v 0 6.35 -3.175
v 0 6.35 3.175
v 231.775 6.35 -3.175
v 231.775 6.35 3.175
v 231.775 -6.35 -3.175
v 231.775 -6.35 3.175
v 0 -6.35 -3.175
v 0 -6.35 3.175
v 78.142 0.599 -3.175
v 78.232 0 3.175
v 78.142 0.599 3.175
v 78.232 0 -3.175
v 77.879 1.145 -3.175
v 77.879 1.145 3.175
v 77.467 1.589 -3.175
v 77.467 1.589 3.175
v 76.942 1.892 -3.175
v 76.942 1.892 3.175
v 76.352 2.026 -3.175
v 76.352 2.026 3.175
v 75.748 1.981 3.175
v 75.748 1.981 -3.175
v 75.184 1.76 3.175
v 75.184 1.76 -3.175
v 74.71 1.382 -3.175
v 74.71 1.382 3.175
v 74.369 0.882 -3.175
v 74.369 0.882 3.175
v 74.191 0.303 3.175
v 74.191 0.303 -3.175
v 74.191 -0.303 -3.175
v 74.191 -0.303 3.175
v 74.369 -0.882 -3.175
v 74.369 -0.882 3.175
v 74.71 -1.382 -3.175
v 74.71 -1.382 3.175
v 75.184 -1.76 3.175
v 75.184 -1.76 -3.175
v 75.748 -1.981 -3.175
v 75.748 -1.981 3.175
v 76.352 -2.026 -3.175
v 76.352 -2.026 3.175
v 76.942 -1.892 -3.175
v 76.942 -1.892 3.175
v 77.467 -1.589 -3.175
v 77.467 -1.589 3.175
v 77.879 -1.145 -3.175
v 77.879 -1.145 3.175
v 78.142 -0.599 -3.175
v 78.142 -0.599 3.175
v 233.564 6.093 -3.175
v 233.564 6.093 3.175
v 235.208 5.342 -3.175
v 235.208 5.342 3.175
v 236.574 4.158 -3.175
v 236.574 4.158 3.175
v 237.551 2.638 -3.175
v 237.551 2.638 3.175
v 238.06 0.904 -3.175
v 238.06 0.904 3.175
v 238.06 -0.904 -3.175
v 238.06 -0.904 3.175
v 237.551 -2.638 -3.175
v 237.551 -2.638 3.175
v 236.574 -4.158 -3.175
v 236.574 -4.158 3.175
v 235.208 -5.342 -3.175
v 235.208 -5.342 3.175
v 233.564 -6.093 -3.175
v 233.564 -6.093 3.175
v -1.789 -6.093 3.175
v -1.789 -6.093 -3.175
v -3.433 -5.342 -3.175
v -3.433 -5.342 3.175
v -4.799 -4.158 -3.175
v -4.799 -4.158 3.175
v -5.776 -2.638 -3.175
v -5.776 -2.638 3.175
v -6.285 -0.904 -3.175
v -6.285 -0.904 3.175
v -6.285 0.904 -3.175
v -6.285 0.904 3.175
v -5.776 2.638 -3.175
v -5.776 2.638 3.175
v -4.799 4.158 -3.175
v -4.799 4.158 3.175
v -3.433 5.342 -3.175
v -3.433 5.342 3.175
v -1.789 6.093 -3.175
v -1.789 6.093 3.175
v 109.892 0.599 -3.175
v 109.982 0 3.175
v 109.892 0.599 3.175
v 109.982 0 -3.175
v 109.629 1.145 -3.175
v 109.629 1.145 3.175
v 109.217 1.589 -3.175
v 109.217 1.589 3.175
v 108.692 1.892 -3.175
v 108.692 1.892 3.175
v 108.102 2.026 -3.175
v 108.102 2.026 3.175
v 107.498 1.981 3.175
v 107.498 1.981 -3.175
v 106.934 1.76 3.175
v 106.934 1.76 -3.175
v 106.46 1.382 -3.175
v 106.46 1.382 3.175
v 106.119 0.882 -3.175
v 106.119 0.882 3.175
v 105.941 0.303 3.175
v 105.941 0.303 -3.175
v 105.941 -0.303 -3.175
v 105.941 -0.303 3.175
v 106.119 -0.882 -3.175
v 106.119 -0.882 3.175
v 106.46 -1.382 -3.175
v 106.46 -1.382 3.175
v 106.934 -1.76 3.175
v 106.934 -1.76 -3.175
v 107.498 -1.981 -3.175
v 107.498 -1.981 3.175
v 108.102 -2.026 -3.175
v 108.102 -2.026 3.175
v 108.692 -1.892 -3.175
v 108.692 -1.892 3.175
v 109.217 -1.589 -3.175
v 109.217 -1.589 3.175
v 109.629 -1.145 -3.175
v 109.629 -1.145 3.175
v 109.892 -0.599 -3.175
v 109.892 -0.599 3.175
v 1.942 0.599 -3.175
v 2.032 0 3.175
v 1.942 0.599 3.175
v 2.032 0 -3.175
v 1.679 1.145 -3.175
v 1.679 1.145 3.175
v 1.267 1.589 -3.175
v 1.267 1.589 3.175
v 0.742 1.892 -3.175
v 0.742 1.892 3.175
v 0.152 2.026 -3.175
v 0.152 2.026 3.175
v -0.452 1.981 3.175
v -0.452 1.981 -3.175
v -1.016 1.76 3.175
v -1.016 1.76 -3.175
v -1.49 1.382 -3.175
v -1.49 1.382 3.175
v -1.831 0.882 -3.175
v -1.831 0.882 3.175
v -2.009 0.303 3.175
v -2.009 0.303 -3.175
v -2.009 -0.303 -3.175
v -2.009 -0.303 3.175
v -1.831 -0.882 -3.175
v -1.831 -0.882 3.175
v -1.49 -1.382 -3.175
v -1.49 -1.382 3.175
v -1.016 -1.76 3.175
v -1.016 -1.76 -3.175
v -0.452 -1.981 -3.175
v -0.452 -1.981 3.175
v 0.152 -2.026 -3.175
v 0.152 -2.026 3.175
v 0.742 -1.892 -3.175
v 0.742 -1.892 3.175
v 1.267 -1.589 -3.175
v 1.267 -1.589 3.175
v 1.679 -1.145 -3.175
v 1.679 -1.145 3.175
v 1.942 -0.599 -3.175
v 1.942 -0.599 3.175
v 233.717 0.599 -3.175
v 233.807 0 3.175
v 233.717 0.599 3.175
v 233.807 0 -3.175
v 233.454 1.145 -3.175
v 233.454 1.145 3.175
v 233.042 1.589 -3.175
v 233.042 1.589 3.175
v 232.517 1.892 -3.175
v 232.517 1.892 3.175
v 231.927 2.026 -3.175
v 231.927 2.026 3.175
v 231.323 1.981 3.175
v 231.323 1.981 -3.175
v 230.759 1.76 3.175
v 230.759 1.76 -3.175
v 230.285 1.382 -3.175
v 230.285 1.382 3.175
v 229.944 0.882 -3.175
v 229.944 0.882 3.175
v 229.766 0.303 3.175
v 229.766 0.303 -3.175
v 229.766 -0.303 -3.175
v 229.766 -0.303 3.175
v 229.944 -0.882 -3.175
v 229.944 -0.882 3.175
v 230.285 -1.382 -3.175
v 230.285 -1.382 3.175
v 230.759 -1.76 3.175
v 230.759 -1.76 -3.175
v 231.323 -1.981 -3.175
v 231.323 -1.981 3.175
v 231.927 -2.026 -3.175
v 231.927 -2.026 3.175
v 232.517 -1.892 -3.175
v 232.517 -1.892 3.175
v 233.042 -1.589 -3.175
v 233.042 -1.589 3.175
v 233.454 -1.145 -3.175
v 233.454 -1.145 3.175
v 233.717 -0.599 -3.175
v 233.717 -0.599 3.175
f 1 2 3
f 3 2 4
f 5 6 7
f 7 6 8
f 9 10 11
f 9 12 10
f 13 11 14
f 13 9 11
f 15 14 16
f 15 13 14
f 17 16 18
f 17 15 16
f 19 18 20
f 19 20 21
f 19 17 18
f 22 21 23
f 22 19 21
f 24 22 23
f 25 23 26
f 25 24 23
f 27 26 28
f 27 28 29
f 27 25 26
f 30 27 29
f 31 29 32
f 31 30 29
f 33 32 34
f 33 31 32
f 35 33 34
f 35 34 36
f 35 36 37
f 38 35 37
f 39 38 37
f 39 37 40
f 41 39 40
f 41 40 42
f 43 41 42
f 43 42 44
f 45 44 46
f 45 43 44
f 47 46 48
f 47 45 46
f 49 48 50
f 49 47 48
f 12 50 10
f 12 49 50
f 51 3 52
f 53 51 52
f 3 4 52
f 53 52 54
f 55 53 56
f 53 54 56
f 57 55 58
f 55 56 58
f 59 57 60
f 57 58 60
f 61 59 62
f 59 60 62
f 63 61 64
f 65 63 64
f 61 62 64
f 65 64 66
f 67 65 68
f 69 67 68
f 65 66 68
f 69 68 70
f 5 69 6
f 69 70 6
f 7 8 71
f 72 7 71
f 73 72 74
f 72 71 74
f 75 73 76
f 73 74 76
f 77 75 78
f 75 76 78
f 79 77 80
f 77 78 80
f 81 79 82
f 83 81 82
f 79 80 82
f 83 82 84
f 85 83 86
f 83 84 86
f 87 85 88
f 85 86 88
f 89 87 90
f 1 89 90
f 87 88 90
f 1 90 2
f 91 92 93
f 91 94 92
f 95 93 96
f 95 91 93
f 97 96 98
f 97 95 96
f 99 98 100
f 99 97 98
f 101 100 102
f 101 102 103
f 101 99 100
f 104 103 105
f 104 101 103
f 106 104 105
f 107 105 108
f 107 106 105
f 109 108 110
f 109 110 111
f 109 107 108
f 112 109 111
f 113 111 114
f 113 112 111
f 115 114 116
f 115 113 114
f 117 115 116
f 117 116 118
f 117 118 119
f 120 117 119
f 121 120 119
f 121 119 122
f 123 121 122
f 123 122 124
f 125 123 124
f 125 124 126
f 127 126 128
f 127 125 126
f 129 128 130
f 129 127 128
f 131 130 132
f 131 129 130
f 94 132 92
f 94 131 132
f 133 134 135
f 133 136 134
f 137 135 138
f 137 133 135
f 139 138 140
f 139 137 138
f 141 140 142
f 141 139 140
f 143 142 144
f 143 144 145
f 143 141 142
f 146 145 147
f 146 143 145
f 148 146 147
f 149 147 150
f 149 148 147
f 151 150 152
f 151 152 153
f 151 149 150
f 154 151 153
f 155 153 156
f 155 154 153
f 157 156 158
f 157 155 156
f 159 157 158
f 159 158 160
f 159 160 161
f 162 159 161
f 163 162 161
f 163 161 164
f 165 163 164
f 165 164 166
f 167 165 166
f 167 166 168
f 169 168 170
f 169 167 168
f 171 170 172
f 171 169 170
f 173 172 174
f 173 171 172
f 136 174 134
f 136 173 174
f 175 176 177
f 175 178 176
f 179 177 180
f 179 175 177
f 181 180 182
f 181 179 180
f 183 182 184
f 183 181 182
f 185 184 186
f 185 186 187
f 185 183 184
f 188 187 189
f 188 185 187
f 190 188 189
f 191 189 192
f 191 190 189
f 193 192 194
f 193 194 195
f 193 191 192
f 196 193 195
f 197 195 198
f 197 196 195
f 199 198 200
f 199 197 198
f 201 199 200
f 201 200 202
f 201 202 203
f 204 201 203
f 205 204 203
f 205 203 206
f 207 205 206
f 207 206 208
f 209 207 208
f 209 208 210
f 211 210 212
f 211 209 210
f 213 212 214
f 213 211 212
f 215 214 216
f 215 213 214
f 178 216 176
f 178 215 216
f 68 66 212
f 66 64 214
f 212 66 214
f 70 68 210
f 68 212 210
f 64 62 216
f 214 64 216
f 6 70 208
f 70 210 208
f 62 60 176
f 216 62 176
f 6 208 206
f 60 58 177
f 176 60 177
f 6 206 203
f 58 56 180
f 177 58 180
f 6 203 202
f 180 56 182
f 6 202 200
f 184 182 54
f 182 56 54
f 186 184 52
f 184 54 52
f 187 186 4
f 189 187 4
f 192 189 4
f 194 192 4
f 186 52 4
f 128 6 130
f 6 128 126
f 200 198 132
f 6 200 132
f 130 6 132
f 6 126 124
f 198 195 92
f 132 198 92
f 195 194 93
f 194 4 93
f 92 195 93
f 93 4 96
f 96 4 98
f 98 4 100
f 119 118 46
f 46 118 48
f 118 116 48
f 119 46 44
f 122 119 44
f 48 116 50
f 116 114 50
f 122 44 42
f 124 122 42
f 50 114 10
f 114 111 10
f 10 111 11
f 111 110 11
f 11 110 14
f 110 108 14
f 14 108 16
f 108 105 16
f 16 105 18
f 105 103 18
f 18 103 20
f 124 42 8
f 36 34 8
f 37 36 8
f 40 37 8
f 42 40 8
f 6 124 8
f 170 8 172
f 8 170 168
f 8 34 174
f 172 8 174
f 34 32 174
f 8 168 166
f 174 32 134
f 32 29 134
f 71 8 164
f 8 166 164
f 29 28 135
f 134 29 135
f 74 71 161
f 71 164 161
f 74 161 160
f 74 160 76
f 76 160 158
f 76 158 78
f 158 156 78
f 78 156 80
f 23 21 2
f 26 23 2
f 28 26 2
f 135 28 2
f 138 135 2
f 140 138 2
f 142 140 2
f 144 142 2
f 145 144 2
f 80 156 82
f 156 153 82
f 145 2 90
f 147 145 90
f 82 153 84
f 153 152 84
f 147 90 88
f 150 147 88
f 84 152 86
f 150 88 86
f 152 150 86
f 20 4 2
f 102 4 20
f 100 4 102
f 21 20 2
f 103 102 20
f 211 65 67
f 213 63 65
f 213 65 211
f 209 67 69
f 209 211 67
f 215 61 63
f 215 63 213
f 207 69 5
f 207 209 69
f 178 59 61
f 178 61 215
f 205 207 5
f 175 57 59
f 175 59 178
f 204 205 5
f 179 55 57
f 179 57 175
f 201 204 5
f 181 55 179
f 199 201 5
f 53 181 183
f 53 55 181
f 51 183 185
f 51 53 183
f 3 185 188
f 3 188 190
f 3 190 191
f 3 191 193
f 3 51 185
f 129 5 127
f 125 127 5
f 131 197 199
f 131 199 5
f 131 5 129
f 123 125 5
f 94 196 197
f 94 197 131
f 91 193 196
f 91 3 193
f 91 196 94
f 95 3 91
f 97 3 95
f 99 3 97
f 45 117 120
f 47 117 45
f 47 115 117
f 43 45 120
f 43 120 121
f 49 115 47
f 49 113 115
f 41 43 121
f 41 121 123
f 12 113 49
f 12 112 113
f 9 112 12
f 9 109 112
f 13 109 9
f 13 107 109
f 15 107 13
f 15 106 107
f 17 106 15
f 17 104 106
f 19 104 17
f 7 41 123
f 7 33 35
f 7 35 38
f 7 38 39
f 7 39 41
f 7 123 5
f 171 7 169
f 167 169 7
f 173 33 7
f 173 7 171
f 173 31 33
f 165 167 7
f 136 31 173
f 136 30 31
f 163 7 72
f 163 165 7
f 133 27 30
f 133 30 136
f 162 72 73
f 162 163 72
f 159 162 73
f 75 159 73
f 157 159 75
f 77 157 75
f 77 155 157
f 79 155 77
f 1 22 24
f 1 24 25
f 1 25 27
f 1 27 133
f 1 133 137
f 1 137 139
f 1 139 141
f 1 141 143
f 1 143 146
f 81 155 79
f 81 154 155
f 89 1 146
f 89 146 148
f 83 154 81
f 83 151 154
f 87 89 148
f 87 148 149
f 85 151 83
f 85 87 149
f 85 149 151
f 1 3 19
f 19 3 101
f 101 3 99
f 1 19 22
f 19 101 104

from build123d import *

# Parameters (mm, degrees)
SKETCH2_R           = 2.032
BOSS_EXTRUDE1_DEPTH = 3.175


with BuildPart() as part:
    # Sketch2 → Boss-Extrude1 (new, symmetric)
    with BuildSketch(Plane.XY):
        with BuildLine():
            Line((0, 6.35), (231.775, 6.35))
            ThreePointArc((231.775, 6.35), (238.125, 0), (231.775, -6.35))
            Line((231.775, -6.35), (0, -6.35))
            ThreePointArc((0, -6.35), (-6.35, 0), (0, 6.35))
        make_face()
        Circle(SKETCH2_R, mode=Mode.SUBTRACT)
        with Locations((231.775, 0)):
            Circle(SKETCH2_R, mode=Mode.SUBTRACT)
        with Locations((76.2, 0)):
            Circle(SKETCH2_R, mode=Mode.SUBTRACT)
        with Locations((107.95, 0)):
            Circle(SKETCH2_R, mode=Mode.SUBTRACT)
    extrude(amount=BOSS_EXTRUDE1_DEPTH, both=True)


solid = part.part
